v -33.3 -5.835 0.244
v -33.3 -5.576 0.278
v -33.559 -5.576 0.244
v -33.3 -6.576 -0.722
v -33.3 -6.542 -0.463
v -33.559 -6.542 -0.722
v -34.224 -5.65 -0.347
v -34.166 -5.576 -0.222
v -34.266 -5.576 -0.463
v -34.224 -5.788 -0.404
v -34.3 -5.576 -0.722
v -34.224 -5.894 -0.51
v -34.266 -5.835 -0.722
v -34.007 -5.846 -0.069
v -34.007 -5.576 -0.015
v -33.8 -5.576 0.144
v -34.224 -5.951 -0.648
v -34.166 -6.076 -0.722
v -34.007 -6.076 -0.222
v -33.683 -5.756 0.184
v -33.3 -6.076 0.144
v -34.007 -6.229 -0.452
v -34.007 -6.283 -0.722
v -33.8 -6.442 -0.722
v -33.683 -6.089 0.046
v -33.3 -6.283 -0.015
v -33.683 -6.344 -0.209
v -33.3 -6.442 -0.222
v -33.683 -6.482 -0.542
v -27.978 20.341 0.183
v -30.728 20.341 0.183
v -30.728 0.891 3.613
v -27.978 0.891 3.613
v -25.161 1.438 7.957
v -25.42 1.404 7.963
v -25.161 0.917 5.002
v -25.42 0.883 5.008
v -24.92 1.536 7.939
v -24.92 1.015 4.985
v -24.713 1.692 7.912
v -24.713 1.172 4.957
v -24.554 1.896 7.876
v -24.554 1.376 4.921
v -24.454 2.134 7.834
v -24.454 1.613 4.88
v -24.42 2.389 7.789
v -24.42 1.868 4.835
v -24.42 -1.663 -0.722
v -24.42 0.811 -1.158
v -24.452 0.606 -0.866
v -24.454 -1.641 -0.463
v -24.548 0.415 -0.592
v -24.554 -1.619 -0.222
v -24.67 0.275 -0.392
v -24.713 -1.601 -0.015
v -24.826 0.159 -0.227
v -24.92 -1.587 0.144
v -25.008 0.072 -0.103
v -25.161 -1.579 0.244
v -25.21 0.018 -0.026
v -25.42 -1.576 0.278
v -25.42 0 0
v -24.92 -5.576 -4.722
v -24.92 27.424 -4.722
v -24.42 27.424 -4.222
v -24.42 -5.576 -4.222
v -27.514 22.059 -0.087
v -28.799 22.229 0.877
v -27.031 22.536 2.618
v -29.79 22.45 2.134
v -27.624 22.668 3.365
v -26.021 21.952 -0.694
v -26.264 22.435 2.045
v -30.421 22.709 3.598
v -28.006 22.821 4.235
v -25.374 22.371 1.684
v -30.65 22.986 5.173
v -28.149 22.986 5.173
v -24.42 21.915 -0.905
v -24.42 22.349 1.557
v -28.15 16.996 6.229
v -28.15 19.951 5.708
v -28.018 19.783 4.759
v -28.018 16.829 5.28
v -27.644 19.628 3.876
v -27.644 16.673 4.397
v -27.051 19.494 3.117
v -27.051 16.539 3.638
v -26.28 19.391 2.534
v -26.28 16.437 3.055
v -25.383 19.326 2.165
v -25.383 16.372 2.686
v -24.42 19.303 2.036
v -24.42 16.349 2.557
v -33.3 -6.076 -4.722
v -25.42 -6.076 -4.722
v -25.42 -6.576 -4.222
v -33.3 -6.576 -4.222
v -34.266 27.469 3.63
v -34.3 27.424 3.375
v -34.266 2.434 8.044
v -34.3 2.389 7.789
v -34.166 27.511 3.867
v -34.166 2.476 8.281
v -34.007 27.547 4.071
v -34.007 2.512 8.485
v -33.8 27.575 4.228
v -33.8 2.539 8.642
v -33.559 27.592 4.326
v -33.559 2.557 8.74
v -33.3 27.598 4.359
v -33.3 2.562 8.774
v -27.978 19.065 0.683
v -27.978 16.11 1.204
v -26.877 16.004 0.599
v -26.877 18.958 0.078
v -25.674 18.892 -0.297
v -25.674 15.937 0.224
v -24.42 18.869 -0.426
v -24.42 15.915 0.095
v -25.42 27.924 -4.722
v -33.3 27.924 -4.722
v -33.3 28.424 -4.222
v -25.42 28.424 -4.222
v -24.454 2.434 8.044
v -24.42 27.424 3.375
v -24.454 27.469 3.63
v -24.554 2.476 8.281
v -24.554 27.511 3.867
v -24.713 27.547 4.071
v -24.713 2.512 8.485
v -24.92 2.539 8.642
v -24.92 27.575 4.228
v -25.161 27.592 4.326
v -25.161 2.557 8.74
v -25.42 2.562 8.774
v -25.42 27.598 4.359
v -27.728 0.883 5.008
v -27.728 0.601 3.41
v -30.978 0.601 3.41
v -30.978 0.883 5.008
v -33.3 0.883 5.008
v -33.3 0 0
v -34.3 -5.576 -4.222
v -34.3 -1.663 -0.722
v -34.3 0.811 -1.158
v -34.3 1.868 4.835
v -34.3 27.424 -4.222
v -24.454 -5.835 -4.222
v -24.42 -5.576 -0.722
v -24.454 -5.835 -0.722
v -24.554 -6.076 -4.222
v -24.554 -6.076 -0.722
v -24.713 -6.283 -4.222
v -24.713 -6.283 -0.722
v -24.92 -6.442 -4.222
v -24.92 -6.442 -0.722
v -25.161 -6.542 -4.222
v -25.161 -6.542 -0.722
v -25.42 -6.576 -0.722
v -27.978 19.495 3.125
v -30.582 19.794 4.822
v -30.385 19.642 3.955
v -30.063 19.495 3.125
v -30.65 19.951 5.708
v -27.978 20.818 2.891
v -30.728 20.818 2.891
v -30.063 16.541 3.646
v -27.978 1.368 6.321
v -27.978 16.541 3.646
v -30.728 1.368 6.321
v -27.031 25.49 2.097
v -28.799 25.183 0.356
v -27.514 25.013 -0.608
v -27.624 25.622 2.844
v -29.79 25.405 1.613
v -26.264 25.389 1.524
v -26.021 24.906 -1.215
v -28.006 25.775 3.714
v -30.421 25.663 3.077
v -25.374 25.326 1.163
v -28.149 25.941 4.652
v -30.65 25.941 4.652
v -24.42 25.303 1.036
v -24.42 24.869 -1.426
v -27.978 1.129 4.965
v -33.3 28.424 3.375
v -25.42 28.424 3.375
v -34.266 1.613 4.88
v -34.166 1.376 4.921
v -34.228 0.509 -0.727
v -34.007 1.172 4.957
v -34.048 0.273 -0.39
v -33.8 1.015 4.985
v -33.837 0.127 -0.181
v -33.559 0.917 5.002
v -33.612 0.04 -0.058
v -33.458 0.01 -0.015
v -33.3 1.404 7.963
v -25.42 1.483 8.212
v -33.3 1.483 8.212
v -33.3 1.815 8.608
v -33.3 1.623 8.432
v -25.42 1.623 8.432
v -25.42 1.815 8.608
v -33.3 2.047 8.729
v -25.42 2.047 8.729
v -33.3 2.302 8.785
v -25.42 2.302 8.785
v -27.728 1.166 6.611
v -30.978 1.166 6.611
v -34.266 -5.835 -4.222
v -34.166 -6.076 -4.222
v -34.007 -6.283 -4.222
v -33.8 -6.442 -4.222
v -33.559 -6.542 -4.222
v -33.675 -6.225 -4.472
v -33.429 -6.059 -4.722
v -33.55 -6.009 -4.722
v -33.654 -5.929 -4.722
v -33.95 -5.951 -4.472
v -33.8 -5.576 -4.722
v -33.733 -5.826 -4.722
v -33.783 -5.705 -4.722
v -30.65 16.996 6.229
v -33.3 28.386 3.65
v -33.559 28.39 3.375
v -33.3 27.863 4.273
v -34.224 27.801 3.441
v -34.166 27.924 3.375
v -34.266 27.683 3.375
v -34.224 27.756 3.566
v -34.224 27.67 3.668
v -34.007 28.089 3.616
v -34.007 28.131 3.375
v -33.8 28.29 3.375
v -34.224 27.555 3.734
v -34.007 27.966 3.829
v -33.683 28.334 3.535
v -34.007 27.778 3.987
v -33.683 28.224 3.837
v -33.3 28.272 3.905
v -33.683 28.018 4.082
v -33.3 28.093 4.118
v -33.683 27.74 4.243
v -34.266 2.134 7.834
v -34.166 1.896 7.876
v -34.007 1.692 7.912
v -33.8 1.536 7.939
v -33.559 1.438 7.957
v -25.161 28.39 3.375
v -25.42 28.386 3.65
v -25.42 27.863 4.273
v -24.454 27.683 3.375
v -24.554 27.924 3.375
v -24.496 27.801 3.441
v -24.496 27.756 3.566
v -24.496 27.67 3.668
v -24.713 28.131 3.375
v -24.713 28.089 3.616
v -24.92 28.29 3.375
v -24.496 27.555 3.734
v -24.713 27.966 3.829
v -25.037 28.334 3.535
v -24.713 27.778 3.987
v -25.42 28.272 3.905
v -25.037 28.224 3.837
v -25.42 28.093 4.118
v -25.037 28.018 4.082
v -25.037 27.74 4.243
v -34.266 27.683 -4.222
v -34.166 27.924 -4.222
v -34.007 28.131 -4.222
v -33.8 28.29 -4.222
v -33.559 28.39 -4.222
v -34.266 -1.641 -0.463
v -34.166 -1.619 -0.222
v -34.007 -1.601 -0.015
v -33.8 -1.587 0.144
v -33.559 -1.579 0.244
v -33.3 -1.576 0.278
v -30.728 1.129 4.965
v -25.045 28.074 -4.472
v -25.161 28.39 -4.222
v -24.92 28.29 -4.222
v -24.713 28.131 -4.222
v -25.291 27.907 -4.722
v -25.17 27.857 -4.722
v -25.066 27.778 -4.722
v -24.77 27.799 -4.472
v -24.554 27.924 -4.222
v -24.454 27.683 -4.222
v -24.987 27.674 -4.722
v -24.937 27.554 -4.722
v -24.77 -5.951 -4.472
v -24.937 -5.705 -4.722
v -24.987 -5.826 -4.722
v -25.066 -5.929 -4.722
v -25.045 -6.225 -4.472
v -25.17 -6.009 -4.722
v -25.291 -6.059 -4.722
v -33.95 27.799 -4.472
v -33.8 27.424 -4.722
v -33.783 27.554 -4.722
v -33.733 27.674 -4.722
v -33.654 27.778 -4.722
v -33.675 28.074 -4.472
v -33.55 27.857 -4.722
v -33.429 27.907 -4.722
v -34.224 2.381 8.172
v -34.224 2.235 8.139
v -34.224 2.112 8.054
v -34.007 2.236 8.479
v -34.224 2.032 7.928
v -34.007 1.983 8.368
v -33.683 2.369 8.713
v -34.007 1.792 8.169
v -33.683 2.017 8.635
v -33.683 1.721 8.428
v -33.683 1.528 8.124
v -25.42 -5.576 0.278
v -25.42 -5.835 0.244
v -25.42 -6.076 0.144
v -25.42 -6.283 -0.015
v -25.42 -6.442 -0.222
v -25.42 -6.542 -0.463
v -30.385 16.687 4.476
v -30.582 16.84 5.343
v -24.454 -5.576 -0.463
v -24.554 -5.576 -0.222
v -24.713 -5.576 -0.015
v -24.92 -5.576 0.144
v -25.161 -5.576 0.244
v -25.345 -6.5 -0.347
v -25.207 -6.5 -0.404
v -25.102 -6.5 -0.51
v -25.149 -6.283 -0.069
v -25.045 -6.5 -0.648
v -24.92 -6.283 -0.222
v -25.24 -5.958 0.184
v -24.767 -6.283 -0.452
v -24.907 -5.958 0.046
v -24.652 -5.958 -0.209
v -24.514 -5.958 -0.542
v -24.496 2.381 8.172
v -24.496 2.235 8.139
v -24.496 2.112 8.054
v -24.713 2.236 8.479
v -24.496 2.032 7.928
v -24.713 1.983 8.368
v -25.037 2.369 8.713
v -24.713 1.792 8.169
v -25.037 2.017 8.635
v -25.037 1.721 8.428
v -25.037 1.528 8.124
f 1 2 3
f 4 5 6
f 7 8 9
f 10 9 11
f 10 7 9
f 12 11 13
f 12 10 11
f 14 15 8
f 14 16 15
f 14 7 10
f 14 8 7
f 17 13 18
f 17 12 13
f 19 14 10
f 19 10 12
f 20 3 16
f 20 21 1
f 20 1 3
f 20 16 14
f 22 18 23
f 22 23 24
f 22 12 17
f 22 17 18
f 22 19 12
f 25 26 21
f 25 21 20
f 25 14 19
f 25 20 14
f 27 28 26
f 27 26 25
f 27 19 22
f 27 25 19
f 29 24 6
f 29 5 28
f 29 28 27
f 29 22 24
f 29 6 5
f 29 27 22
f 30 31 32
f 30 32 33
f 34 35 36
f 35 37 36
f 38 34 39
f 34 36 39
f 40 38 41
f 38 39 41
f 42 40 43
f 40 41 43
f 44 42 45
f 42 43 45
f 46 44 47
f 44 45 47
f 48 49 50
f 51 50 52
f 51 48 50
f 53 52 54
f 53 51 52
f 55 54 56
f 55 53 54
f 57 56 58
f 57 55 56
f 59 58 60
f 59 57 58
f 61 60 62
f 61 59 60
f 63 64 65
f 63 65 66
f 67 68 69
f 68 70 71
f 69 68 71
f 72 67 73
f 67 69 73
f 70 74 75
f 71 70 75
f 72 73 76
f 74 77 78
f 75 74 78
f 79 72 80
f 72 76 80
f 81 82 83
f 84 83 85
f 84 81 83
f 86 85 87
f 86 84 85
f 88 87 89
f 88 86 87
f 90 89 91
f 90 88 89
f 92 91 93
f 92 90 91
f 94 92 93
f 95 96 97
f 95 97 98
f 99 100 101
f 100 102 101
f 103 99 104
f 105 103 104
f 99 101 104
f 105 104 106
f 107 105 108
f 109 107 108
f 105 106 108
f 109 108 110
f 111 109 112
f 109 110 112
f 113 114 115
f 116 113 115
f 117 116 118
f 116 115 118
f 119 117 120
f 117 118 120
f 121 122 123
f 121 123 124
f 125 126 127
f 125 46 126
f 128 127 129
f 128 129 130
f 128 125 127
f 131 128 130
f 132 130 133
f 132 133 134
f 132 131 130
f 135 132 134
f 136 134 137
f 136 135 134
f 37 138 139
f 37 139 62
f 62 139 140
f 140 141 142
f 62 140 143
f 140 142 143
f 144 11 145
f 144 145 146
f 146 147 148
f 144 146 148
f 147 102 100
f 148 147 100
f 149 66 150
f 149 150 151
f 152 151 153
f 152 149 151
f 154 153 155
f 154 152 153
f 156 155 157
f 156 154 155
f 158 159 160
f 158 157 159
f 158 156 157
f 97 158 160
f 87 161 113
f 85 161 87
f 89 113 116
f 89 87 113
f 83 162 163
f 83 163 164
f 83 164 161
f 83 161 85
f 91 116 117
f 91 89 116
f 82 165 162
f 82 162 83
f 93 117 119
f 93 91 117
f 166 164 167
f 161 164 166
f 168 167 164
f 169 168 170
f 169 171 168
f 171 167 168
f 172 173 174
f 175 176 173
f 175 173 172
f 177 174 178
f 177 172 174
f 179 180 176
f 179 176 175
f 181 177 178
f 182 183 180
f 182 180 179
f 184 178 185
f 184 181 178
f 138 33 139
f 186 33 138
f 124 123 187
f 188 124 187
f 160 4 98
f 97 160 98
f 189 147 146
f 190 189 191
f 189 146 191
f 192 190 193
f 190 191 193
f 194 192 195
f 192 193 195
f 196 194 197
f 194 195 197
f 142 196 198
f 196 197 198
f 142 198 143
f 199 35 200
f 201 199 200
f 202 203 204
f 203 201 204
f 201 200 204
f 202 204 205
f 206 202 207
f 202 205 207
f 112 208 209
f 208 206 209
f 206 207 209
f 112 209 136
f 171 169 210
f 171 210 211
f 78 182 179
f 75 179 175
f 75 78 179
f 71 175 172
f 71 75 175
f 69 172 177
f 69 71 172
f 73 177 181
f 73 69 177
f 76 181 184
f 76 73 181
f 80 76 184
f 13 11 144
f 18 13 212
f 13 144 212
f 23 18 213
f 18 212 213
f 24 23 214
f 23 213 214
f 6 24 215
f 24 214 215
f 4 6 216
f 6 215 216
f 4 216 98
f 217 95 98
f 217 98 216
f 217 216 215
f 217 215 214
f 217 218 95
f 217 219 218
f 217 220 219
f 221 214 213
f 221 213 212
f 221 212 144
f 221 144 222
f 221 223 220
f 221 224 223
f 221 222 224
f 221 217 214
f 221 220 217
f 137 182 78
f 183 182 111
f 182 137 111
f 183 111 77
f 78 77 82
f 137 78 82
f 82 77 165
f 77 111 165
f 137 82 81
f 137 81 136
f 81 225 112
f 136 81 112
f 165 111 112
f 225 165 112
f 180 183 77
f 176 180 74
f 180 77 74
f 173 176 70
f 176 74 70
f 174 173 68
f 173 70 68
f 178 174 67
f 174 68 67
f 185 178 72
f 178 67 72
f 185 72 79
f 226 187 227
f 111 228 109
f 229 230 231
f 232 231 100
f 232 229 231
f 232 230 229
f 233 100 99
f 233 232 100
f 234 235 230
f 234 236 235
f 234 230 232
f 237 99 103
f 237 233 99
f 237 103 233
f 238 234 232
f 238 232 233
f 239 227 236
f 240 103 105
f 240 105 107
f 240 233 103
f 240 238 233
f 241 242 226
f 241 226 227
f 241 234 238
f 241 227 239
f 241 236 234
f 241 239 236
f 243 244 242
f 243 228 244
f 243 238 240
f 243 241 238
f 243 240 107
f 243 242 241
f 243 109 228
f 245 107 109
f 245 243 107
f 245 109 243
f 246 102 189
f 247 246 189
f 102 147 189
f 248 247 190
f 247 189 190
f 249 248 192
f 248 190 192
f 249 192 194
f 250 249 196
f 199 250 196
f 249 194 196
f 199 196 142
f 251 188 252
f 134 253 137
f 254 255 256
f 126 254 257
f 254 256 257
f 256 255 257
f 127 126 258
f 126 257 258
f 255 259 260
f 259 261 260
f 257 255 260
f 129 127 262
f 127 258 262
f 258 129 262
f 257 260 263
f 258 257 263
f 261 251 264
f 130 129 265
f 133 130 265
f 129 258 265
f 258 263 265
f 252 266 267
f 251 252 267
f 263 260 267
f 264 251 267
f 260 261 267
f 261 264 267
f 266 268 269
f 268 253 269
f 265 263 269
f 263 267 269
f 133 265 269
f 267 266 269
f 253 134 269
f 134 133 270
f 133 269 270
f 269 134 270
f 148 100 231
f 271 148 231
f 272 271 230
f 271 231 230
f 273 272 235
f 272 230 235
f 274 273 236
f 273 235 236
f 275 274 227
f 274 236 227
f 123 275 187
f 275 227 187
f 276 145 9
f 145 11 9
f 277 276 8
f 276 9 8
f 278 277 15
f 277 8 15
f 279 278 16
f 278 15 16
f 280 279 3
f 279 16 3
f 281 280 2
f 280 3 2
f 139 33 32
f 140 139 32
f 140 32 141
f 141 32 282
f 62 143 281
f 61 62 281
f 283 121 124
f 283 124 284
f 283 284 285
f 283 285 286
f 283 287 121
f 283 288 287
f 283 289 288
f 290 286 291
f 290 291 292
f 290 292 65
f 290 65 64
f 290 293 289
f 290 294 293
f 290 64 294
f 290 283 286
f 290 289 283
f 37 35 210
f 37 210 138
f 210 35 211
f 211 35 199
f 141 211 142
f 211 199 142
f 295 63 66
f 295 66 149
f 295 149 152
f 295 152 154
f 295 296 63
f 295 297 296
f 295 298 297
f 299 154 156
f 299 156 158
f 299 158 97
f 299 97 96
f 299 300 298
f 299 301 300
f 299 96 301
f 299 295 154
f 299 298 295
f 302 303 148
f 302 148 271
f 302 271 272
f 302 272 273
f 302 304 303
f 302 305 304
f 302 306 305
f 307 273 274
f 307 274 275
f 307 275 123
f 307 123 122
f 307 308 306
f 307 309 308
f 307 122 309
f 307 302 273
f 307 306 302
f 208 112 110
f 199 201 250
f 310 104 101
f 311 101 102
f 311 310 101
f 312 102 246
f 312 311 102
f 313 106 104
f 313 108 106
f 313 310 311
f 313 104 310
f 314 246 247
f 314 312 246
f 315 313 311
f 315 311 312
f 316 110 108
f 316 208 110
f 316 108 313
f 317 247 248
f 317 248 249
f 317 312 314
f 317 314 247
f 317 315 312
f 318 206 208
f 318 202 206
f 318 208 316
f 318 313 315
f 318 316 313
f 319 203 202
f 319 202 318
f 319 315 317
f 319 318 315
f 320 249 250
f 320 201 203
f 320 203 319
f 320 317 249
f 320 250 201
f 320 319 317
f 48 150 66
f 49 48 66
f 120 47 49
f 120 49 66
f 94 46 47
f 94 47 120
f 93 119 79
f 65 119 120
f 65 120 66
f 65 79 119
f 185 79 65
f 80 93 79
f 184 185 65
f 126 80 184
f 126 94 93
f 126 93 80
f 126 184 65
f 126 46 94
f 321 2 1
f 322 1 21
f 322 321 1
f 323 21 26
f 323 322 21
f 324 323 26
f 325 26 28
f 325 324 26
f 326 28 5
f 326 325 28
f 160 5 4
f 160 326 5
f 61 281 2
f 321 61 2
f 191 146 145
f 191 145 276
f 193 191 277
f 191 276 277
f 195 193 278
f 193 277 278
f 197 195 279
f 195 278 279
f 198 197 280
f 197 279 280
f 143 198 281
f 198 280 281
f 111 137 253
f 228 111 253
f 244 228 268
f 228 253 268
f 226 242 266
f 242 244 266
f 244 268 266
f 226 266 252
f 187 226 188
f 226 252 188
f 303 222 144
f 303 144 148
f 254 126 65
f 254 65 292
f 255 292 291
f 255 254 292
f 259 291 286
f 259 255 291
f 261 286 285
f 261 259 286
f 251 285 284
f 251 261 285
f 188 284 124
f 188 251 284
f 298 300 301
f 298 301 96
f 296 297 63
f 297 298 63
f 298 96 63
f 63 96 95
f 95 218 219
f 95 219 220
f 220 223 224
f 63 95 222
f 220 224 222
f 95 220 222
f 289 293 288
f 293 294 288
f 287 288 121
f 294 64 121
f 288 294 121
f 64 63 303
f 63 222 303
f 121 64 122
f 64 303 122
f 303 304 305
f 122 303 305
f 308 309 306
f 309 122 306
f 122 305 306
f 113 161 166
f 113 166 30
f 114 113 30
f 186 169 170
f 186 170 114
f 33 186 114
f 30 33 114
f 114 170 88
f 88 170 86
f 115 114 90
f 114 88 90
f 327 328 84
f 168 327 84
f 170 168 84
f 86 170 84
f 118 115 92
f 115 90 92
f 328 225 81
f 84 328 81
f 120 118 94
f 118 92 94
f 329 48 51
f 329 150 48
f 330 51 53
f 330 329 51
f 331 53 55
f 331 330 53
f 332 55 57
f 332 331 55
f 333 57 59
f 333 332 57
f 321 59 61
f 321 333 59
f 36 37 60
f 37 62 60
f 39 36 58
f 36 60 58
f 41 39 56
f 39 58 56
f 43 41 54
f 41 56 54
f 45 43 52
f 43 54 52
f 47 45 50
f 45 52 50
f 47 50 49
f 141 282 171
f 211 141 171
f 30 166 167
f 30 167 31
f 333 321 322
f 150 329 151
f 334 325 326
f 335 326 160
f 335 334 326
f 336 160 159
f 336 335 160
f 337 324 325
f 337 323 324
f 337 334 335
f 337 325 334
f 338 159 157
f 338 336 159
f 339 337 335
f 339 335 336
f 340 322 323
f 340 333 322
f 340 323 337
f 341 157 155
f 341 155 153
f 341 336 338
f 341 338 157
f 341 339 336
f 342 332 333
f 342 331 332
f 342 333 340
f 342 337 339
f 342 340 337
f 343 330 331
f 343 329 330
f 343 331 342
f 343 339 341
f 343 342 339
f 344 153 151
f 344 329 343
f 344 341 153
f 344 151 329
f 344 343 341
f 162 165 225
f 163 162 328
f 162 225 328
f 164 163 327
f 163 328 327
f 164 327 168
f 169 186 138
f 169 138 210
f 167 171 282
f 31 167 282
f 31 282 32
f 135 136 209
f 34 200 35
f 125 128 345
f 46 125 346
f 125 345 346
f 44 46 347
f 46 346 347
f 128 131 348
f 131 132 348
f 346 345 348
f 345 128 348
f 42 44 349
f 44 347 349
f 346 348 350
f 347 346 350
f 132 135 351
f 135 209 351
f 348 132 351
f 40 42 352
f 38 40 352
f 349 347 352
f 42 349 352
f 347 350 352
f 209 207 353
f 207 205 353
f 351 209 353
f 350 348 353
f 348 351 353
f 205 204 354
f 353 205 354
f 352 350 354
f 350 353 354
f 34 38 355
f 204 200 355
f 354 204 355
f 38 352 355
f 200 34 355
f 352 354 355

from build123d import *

# Parameters (mm, degrees)
SKETCH003_R             = 6.25
SKETCH003_R_2           = 3.75
PAD002_DEPTH            = 3
BODY002_PLACEMENT_ANGLE = 350
PAD_DEPTH               = 9.88
SKETCH001_W             = 2.75
SKETCH001_H             = 2.75
POCKET_DEPTH            = 20
FILLET_R                = 1
CHAMFER_SIZE            = 0.5
CHAMFER001_SIZE         = 0.25


with BuildPart() as ty_rap_cutter1:
    # Sketch003 → Pad002 (new body)
    with BuildSketch(Plane.XZ):
        Circle(SKETCH003_R)
        Circle(SKETCH003_R_2, mode=Mode.SUBTRACT)
    extrude(amount=-PAD002_DEPTH)


with BuildPart() as ty_rap_cutter1_1:
    # Body002 placement: moved
    add(ty_rap_cutter1.part.moved(Location((-24.4, 17, 6.25))).rotate(Axis((-24.4, 17, 6.25), (1, 0, 0)), BODY002_PLACEMENT_ANGLE))


with BuildPart() as ty_rap_cutter2:
    # Body003 base: copy of ty-rap-cutter1
    add(ty_rap_cutter1_1.part)


with BuildPart() as ty_rap_cutter2_1:
    # Body003 placement: moved
    add(ty_rap_cutter2.part.moved(Location((0, 6, -1))))


with BuildPart() as foot_w_cuts:
    # Sketch → Pad (new body)
    with BuildSketch(Plane.YZ):
        Polygon((1.57769, 8.947526), (0.883098, 5.008295), (0, 0), (-1.575692, 0.277837), (-6.575692, 0.277837), (-6.575692, -4.722163), (28.424308, -4.722163), (28.424308, 4.213743), align=None)
    extrude(amount=PAD_DEPTH)

    # Sketch001 (on Face9 of Pad) → Pocket (cut)
    with BuildSketch(Plane(origin=(0, 0, 0), x_dir=(0, -0.173648, -0.984808), z_dir=(0, -0.984808, 0.173648))):
        with Locations((-5.087502, 4.946713)):
            Rectangle(SKETCH001_W, SKETCH001_H)
    extrude(amount=-POCKET_DEPTH, mode=Mode.SUBTRACT)

    # Fillet
    fillet_edges = [foot_w_cuts.edges().sort_by_distance(p)[0] for p in [
        (9.88, -4.075692, 0.277837),
        (4.94, -6.575692, 0.277837),
        (0, -4.075692, 0.277837),
        (4.94, 1.57769, 8.947526),
        (0, 15.000999, 6.580635),
        (9.88, 15.000999, 6.580635),
        (9.88, 0.788845, 4.473763),
        (0, 0.788845, 4.473763),
        (4.94, 28.424308, 4.213743),
        (9.88, 28.424308, -0.25421),
        (9.88, -0.787846, 0.138919),
        (0, -0.787846, 0.138919),
        (9.88, -6.575692, -2.222163),
        (0, -6.575692, -2.222163),
        (0, 28.424308, -0.25421),
    ]]
    fillet(fillet_edges, radius=FILLET_R)

    # Chamfer
    chamfer_edges = [foot_w_cuts.edges().sort_by_distance(p)[0] for p in [
        (0, 10.924308, -4.722163),
    ]]
    chamfer(chamfer_edges, length=CHAMFER_SIZE)

    # Chamfer001
    chamfer001_edges = [foot_w_cuts.edges().sort_by_distance(p)[0] for p in [
        (3.571713, 0.883435, 5.010211),
        (4.946713, 1.122202, 6.364322),
        (6.321713, 0.883435, 5.010211),
        (4.946713, 0.644669, 3.656101),
    ]]
    chamfer(chamfer001_edges, length=CHAMFER001_SIZE)


with BuildPart() as foot_w_cuts_1:
    # Body placement: moved
    add(foot_w_cuts.part.moved(Location((-34.3, 0, 0))))

    # Cut: cut ty-rap-cutter1
    add(ty_rap_cutter1_1.part, mode=Mode.SUBTRACT)

    # Cut001: cut ty-rap-cutter2
    add(ty_rap_cutter2_1.part, mode=Mode.SUBTRACT)


solid = foot_w_cuts_1.part
